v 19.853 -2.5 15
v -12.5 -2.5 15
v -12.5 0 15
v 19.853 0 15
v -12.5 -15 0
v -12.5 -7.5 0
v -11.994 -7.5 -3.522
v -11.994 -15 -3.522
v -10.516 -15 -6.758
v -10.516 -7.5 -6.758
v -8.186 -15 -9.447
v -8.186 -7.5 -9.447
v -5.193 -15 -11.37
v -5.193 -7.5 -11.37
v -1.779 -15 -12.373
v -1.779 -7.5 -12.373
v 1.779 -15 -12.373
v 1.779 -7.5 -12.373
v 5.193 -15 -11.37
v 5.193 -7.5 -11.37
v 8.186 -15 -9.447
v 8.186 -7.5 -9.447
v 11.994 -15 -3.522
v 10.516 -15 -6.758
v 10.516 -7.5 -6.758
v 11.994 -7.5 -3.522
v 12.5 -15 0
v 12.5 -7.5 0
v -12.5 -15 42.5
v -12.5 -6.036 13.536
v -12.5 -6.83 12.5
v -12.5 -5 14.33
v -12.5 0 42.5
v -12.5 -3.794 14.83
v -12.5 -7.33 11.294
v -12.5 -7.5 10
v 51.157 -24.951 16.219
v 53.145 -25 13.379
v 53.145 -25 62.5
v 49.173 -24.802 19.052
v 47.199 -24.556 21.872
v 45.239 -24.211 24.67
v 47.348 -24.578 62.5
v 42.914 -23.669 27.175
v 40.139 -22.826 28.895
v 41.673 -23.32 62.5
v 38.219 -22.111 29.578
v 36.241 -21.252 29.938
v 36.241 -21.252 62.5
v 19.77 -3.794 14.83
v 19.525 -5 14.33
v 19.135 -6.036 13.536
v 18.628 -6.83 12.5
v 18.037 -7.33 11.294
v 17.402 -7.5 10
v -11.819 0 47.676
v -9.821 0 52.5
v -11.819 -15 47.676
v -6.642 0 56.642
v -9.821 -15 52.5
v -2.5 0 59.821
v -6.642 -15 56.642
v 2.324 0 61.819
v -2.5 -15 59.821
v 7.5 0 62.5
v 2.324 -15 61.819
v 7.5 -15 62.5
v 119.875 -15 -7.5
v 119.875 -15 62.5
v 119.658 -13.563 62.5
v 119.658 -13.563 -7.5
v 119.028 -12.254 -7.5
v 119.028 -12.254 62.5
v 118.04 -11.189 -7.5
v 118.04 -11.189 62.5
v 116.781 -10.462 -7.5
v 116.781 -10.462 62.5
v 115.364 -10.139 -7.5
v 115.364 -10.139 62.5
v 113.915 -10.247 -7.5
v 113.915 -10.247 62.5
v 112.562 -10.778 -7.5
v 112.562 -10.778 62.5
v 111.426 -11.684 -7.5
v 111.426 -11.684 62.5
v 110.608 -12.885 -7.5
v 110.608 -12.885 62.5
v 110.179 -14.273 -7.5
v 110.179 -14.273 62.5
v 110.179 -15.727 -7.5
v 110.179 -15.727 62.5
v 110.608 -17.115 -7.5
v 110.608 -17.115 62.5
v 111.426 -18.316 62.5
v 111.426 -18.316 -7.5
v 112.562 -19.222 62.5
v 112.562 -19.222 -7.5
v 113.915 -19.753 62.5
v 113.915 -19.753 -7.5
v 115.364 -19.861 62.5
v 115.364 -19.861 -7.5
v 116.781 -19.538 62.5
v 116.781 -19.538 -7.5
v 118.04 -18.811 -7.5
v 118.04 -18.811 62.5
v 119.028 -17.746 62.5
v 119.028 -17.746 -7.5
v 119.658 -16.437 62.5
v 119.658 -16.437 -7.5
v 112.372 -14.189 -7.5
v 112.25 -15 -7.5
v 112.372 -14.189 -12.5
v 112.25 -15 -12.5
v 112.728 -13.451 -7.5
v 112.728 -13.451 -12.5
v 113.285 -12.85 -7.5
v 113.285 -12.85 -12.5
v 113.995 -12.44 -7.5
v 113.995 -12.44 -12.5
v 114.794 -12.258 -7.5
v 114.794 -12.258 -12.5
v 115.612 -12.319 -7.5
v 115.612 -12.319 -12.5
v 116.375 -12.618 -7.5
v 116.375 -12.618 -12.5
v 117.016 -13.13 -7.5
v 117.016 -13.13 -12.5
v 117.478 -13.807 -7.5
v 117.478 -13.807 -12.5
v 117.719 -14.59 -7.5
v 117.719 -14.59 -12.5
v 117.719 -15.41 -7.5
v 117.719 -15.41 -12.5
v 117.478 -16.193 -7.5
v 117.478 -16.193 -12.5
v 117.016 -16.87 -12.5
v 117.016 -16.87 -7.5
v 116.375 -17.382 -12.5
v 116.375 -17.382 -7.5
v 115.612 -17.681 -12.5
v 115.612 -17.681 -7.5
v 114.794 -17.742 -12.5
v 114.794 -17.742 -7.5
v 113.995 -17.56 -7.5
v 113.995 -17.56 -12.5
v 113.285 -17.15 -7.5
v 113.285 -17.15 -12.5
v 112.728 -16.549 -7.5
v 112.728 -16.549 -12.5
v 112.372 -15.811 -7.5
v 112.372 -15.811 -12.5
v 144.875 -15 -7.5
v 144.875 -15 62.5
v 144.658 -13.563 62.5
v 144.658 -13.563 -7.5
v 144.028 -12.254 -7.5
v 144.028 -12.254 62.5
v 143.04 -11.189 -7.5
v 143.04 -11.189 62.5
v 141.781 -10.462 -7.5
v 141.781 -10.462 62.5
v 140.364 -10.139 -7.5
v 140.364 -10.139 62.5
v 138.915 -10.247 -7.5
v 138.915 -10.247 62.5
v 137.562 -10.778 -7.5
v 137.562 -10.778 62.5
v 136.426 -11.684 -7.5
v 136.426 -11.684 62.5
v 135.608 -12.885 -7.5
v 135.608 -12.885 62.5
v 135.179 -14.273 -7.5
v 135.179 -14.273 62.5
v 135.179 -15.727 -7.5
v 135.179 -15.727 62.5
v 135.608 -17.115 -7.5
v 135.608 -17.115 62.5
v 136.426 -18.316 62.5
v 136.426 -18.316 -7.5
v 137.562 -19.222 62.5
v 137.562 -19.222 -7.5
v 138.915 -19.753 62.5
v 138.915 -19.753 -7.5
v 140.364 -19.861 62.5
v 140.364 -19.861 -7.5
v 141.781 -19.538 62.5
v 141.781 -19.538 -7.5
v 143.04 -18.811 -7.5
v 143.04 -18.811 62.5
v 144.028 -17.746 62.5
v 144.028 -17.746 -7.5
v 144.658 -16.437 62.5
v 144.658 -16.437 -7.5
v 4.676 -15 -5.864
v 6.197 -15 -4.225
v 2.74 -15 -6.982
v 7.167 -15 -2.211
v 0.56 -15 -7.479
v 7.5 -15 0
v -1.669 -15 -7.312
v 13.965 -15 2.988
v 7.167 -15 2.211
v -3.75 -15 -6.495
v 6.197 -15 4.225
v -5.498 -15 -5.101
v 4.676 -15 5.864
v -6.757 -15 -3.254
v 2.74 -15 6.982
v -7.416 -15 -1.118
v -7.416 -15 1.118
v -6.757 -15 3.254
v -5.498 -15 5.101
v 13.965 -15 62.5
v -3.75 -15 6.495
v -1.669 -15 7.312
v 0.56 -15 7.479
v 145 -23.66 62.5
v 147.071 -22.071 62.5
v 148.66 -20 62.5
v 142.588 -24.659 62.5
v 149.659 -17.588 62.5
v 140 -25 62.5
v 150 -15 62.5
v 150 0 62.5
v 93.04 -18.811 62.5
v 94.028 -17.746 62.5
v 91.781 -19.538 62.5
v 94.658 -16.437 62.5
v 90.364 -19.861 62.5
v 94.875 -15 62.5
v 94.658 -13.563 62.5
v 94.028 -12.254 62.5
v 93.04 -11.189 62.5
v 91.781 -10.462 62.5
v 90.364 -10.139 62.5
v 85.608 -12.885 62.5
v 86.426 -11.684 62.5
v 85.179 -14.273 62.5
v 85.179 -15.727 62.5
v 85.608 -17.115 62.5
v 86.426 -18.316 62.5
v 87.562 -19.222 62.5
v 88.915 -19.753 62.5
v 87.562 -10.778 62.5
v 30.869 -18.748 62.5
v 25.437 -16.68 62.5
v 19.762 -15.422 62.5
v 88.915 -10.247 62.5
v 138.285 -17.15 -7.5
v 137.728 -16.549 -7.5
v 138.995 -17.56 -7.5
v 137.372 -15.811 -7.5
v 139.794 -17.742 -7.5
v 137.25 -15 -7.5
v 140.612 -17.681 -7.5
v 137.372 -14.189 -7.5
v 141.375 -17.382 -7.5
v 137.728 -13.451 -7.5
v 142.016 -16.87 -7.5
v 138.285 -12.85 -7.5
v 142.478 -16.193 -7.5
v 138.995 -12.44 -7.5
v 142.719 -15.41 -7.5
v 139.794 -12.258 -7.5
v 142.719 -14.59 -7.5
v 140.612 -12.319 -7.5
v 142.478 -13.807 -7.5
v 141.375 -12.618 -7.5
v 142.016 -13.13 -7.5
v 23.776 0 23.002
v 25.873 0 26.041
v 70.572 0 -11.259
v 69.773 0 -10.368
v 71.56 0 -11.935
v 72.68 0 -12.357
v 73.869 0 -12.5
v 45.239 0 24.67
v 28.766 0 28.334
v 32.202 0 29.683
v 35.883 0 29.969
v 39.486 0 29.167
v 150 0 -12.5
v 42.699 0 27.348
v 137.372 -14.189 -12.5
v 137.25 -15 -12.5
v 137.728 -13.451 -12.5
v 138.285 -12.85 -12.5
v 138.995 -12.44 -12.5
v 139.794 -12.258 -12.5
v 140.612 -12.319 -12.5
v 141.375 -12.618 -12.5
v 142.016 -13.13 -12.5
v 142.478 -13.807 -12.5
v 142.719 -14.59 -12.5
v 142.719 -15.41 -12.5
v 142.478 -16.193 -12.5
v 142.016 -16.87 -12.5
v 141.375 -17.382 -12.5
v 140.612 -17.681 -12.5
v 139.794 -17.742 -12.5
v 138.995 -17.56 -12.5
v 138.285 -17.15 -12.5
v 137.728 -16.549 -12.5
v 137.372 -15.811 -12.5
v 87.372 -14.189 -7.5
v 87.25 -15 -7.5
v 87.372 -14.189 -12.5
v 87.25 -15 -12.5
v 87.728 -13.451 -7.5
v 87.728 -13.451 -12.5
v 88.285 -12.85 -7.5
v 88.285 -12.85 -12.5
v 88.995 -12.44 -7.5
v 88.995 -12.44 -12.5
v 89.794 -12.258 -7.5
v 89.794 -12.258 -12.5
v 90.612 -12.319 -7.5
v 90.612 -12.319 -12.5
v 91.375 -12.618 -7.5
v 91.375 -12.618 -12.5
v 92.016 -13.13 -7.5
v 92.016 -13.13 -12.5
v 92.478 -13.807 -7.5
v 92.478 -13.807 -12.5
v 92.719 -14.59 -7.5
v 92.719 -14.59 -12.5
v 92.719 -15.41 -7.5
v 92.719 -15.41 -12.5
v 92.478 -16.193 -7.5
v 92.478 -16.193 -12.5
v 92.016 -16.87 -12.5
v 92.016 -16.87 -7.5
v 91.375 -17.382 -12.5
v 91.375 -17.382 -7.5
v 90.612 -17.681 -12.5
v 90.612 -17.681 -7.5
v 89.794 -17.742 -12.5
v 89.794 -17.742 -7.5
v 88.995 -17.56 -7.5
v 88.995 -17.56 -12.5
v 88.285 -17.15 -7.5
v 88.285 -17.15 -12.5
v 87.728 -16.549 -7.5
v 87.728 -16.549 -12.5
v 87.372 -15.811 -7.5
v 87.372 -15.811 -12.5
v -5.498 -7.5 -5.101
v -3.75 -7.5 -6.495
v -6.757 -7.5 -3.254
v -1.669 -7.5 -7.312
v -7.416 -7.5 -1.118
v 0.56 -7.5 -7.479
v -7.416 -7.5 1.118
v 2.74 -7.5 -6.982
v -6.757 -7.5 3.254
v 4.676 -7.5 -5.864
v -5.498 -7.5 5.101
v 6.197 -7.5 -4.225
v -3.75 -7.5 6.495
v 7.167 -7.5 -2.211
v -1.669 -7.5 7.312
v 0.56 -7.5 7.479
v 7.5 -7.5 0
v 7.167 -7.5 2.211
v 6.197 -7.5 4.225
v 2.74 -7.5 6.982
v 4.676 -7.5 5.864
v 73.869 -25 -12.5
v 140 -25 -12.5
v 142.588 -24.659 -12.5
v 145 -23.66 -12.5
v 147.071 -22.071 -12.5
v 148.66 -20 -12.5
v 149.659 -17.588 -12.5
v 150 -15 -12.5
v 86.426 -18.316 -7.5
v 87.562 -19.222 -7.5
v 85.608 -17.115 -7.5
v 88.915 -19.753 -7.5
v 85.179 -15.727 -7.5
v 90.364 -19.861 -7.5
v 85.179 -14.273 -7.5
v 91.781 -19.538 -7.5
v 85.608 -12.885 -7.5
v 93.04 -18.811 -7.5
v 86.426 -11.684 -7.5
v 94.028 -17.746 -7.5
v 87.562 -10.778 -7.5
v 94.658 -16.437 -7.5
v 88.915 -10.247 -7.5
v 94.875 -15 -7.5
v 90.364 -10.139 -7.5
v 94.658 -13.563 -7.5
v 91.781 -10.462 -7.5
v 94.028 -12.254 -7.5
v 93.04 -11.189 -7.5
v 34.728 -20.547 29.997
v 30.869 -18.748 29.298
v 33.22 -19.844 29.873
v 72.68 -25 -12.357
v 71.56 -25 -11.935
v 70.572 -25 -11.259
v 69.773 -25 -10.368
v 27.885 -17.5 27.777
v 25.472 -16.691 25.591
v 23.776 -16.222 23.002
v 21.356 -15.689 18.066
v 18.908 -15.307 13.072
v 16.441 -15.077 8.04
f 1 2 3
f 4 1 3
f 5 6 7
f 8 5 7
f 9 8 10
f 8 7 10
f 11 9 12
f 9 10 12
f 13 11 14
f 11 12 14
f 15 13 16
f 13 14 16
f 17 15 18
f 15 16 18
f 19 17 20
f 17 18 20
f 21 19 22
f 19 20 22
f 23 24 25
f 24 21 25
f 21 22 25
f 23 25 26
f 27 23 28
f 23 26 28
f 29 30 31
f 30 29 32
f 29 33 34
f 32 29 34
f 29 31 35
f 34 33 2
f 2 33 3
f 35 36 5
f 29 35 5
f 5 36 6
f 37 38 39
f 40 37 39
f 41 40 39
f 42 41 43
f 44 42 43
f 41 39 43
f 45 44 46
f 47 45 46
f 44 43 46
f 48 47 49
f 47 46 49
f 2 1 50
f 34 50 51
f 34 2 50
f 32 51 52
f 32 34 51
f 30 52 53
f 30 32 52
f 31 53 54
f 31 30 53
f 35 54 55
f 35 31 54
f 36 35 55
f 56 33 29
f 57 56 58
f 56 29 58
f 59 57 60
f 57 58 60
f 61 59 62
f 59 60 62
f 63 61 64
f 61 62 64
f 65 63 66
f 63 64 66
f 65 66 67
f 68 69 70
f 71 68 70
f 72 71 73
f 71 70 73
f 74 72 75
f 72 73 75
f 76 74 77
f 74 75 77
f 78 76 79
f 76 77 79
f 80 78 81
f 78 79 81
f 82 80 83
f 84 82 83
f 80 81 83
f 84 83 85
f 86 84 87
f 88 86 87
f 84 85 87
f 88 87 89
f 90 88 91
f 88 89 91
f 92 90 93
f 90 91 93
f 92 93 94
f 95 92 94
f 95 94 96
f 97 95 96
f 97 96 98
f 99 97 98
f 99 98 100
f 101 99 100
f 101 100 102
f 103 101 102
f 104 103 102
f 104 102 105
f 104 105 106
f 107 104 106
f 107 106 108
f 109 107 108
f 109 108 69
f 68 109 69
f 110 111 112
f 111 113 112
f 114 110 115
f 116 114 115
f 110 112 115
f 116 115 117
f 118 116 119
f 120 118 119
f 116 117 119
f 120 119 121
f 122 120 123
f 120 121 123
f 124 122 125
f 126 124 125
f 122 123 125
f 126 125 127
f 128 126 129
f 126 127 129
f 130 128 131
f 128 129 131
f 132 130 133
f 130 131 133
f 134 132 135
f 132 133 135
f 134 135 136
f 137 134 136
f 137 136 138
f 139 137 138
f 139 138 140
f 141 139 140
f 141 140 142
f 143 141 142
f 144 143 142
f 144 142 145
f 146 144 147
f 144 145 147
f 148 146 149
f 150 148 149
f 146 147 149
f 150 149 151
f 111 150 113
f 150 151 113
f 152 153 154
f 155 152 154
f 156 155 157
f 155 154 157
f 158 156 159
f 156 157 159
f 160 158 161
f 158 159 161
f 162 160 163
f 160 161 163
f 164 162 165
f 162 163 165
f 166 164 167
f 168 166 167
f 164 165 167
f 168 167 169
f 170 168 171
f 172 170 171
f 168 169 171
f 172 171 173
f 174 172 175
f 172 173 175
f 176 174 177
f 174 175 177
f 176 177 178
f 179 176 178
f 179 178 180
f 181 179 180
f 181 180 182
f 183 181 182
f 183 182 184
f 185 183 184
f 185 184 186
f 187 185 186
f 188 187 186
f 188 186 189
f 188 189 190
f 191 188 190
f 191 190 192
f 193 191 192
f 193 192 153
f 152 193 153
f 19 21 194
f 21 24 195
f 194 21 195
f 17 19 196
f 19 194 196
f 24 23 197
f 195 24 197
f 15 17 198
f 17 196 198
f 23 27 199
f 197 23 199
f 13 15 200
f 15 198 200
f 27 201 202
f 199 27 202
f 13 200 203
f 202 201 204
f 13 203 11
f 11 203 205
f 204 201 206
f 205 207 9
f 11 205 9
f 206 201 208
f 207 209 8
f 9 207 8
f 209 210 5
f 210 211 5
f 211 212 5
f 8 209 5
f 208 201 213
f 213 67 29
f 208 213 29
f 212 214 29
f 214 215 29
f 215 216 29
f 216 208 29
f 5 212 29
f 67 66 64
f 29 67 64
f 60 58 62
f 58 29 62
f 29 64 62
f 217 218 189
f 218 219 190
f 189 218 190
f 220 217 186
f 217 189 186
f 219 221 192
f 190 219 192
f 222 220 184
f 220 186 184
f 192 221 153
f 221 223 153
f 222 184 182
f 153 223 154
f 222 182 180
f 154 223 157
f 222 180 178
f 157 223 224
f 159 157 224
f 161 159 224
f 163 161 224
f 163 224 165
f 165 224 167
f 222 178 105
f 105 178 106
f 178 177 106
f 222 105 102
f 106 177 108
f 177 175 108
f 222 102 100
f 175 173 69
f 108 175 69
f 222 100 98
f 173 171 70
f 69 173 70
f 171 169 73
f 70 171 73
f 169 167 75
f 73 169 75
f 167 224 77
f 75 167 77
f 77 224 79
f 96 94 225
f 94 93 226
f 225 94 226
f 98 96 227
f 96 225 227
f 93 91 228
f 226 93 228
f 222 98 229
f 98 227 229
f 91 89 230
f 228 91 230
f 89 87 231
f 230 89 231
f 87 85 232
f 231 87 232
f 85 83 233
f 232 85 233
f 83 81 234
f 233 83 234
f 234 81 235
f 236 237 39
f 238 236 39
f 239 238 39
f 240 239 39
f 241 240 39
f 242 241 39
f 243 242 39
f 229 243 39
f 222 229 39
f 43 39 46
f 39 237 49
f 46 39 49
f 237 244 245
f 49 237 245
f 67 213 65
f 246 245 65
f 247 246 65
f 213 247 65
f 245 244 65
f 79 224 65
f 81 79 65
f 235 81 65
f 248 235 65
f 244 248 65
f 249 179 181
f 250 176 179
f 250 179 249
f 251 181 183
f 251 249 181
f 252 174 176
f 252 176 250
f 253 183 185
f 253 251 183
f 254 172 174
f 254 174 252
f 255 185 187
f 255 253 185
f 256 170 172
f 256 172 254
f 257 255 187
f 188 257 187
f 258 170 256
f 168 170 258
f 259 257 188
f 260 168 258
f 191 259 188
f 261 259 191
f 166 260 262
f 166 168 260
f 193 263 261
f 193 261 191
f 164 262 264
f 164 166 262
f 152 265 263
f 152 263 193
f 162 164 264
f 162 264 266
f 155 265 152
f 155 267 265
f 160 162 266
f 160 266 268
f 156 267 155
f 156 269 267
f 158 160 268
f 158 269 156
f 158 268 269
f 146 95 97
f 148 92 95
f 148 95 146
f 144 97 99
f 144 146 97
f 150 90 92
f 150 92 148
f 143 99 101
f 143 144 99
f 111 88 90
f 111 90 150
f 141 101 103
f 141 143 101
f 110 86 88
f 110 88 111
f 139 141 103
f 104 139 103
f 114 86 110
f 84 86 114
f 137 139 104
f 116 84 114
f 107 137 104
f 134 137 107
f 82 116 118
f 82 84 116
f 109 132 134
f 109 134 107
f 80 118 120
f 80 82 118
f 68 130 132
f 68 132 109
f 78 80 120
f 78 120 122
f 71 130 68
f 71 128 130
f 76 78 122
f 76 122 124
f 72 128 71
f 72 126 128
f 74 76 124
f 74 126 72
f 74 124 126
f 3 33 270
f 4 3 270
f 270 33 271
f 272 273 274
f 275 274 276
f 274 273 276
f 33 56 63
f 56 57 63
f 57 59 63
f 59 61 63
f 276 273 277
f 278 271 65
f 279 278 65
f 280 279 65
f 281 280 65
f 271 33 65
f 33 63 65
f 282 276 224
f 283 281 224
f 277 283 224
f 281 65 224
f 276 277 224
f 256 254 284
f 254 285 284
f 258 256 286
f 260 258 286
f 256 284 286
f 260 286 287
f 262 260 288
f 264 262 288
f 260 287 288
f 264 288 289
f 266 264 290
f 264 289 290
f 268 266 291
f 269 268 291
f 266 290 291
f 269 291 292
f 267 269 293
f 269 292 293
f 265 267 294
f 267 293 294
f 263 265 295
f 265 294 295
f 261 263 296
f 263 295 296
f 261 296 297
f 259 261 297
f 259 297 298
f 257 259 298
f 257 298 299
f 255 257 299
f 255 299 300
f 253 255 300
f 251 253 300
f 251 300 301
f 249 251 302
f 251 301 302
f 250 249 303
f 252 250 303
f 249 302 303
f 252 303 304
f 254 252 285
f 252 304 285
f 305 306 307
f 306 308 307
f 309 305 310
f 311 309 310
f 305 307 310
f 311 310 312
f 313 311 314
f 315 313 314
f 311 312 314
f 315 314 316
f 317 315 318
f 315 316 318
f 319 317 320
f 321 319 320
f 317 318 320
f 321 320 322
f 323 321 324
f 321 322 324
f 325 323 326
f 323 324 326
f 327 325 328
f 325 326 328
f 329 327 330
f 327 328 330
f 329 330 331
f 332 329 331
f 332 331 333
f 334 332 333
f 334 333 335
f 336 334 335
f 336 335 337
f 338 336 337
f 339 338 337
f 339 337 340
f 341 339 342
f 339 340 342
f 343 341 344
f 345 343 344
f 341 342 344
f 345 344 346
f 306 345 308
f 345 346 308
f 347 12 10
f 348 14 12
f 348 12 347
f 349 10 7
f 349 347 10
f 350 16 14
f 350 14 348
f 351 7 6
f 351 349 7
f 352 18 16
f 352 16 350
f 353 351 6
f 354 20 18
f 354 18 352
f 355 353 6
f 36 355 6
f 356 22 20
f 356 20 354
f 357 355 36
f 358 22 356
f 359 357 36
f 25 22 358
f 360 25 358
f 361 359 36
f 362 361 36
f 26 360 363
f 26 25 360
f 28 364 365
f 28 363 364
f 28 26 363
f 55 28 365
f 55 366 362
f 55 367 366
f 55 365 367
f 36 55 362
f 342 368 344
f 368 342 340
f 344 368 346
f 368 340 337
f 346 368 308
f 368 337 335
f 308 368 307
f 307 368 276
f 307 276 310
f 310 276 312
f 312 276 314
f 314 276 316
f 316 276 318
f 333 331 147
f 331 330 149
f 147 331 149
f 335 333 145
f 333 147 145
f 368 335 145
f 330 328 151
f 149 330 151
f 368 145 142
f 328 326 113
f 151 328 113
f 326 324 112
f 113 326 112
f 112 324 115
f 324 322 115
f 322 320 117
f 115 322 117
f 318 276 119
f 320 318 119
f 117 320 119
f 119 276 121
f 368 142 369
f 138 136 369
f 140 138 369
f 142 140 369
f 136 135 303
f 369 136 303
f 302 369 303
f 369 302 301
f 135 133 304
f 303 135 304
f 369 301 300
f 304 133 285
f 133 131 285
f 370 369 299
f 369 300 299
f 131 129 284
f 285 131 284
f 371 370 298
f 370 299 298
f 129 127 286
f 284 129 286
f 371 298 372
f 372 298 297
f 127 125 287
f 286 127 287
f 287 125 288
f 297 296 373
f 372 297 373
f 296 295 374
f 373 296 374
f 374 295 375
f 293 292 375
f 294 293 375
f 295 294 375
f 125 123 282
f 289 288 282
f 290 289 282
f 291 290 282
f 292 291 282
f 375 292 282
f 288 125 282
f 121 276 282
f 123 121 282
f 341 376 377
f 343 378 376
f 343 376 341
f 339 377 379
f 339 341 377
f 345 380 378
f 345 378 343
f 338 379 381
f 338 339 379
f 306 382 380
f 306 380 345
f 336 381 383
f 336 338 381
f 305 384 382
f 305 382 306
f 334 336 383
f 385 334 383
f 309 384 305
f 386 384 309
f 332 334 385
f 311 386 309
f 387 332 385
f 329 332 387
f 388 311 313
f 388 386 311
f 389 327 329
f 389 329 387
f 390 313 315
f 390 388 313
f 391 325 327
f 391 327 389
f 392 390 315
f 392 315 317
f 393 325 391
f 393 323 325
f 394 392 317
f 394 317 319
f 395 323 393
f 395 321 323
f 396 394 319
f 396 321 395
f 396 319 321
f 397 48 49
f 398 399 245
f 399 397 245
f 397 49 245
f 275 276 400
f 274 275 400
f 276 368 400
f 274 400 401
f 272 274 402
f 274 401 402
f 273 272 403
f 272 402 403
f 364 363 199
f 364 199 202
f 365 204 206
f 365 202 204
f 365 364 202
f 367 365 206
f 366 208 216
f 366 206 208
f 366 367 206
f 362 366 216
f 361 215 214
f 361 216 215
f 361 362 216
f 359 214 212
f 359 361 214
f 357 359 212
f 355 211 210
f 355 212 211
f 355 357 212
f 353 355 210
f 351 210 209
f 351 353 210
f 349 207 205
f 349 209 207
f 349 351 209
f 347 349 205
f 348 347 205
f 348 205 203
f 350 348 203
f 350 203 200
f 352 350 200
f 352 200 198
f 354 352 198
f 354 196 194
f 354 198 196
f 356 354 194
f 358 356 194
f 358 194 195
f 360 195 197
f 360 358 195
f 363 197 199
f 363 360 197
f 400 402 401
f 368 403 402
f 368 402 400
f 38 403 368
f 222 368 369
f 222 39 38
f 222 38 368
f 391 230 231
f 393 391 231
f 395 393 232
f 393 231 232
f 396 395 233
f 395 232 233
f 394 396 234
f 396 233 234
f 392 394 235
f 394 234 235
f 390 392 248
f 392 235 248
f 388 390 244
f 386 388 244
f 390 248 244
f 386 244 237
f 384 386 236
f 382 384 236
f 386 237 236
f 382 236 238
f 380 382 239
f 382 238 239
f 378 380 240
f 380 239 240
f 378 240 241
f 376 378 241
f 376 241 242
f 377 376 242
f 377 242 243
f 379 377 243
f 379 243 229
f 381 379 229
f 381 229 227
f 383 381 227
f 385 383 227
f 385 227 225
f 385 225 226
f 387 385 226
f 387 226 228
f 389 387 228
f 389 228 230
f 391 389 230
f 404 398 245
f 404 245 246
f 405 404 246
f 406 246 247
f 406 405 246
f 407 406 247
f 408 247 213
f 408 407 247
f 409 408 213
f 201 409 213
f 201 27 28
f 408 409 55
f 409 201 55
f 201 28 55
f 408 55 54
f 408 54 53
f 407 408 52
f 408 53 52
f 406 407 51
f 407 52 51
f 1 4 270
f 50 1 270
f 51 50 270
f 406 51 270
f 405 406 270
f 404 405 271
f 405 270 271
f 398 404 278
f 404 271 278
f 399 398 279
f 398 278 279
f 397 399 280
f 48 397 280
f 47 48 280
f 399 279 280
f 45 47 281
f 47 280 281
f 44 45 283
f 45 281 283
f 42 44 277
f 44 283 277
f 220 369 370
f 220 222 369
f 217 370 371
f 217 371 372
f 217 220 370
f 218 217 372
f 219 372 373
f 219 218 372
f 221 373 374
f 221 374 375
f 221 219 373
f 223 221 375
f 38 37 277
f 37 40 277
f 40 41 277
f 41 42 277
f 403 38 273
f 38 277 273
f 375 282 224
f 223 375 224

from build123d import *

# Parameters (mm, degrees)
F0_R           = 7.5
F1_DEPTH       = 25
F2_W           = 7.5
F2_H           = 45
F3_DEPTH       = 25
F5_D           = 5.5
F5_CBORE_D     = 9.75
F5_CBORE_DEPTH = 70
F6_R           = 20
F7_R           = 5
F8_R           = 10
F9_R           = 5
F11_DEPTH      = 100
F12_R          = 40


with BuildPart() as f1:
    # F0 (on Front) → F1 (new body)
    with BuildSketch(Plane.XZ):
        with BuildLine():
            Line((45.239401, 24.669705), (71.265909, -12.5))
            Line((71.265909, -12.5), (150, -12.5))
            Line((150, -12.5), (150, 62.5))
            Line((150, 62.5), (-12.5, 62.5))
            Line((-12.5, 62.5), (-12.5, 0))
            ThreePointArc((-12.5, 0), (0, -12.5), (12.5, 0))
            Line((12.5, 0), (23.776091, 23.002169))
            ThreePointArc((23.776091, 23.002169), (34.031763, 29.962444), (45.239401, 24.669705))
        make_face()
        Circle(F0_R, mode=Mode.SUBTRACT)
    extrude(amount=F1_DEPTH)

    # F2 (on Right) → F3 (cut, symmetric)
    with BuildSketch(Plane.YZ):
        with Locations((-3.75, -7.5)):
            Rectangle(F2_W, F2_H)
    extrude(amount=F3_DEPTH, both=True, mode=Mode.SUBTRACT)

    # F5 (through all)
    with Locations(Plane.XY.offset(62.5)):
        with Locations((140, -15), (115, -15), (90, -15)):
            CounterBoreHole(F5_D / 2, F5_CBORE_D / 2, F5_CBORE_DEPTH)

    # F6
    f6_edges = [f1.edges().sort_by_distance(p)[0] for p in [
        (-12.5, -12.5, 62.5),
    ]]
    fillet(f6_edges, radius=F6_R)

    # F7
    f7_edges = [f1.edges().sort_by_distance(p)[0] for p in [
        (3.676639, -7.5, 15),
    ]]
    fillet(f7_edges, radius=F7_R)

    # F8
    f8_edges = [f1.edges().sort_by_distance(p)[0] for p in [
        (150, -25, 25),
    ]]
    fillet(f8_edges, radius=F8_R)

    # F9
    f9_edges = [f1.edges().sort_by_distance(p)[0] for p in [
        (71.265909, -12.5, -12.5),
    ]]
    fillet(f9_edges, radius=F9_R)

    # F10 (on Top) → F11 (cut, symmetric)
    with BuildSketch(Plane.XY):
        Polygon((22.832396, -15), (-25, -15), (-25, -30), (55, -30), align=None)
    extrude(amount=F11_DEPTH, both=True, mode=Mode.SUBTRACT)

    # F12
    f12_edges = [f1.edges().sort_by_distance(p)[0] for p in [
        (22.832396, -15, 41.78856),
        (44.277465, -25, 44.188634),
    ]]
    fillet(f12_edges, radius=F12_R)


solid = f1.part
